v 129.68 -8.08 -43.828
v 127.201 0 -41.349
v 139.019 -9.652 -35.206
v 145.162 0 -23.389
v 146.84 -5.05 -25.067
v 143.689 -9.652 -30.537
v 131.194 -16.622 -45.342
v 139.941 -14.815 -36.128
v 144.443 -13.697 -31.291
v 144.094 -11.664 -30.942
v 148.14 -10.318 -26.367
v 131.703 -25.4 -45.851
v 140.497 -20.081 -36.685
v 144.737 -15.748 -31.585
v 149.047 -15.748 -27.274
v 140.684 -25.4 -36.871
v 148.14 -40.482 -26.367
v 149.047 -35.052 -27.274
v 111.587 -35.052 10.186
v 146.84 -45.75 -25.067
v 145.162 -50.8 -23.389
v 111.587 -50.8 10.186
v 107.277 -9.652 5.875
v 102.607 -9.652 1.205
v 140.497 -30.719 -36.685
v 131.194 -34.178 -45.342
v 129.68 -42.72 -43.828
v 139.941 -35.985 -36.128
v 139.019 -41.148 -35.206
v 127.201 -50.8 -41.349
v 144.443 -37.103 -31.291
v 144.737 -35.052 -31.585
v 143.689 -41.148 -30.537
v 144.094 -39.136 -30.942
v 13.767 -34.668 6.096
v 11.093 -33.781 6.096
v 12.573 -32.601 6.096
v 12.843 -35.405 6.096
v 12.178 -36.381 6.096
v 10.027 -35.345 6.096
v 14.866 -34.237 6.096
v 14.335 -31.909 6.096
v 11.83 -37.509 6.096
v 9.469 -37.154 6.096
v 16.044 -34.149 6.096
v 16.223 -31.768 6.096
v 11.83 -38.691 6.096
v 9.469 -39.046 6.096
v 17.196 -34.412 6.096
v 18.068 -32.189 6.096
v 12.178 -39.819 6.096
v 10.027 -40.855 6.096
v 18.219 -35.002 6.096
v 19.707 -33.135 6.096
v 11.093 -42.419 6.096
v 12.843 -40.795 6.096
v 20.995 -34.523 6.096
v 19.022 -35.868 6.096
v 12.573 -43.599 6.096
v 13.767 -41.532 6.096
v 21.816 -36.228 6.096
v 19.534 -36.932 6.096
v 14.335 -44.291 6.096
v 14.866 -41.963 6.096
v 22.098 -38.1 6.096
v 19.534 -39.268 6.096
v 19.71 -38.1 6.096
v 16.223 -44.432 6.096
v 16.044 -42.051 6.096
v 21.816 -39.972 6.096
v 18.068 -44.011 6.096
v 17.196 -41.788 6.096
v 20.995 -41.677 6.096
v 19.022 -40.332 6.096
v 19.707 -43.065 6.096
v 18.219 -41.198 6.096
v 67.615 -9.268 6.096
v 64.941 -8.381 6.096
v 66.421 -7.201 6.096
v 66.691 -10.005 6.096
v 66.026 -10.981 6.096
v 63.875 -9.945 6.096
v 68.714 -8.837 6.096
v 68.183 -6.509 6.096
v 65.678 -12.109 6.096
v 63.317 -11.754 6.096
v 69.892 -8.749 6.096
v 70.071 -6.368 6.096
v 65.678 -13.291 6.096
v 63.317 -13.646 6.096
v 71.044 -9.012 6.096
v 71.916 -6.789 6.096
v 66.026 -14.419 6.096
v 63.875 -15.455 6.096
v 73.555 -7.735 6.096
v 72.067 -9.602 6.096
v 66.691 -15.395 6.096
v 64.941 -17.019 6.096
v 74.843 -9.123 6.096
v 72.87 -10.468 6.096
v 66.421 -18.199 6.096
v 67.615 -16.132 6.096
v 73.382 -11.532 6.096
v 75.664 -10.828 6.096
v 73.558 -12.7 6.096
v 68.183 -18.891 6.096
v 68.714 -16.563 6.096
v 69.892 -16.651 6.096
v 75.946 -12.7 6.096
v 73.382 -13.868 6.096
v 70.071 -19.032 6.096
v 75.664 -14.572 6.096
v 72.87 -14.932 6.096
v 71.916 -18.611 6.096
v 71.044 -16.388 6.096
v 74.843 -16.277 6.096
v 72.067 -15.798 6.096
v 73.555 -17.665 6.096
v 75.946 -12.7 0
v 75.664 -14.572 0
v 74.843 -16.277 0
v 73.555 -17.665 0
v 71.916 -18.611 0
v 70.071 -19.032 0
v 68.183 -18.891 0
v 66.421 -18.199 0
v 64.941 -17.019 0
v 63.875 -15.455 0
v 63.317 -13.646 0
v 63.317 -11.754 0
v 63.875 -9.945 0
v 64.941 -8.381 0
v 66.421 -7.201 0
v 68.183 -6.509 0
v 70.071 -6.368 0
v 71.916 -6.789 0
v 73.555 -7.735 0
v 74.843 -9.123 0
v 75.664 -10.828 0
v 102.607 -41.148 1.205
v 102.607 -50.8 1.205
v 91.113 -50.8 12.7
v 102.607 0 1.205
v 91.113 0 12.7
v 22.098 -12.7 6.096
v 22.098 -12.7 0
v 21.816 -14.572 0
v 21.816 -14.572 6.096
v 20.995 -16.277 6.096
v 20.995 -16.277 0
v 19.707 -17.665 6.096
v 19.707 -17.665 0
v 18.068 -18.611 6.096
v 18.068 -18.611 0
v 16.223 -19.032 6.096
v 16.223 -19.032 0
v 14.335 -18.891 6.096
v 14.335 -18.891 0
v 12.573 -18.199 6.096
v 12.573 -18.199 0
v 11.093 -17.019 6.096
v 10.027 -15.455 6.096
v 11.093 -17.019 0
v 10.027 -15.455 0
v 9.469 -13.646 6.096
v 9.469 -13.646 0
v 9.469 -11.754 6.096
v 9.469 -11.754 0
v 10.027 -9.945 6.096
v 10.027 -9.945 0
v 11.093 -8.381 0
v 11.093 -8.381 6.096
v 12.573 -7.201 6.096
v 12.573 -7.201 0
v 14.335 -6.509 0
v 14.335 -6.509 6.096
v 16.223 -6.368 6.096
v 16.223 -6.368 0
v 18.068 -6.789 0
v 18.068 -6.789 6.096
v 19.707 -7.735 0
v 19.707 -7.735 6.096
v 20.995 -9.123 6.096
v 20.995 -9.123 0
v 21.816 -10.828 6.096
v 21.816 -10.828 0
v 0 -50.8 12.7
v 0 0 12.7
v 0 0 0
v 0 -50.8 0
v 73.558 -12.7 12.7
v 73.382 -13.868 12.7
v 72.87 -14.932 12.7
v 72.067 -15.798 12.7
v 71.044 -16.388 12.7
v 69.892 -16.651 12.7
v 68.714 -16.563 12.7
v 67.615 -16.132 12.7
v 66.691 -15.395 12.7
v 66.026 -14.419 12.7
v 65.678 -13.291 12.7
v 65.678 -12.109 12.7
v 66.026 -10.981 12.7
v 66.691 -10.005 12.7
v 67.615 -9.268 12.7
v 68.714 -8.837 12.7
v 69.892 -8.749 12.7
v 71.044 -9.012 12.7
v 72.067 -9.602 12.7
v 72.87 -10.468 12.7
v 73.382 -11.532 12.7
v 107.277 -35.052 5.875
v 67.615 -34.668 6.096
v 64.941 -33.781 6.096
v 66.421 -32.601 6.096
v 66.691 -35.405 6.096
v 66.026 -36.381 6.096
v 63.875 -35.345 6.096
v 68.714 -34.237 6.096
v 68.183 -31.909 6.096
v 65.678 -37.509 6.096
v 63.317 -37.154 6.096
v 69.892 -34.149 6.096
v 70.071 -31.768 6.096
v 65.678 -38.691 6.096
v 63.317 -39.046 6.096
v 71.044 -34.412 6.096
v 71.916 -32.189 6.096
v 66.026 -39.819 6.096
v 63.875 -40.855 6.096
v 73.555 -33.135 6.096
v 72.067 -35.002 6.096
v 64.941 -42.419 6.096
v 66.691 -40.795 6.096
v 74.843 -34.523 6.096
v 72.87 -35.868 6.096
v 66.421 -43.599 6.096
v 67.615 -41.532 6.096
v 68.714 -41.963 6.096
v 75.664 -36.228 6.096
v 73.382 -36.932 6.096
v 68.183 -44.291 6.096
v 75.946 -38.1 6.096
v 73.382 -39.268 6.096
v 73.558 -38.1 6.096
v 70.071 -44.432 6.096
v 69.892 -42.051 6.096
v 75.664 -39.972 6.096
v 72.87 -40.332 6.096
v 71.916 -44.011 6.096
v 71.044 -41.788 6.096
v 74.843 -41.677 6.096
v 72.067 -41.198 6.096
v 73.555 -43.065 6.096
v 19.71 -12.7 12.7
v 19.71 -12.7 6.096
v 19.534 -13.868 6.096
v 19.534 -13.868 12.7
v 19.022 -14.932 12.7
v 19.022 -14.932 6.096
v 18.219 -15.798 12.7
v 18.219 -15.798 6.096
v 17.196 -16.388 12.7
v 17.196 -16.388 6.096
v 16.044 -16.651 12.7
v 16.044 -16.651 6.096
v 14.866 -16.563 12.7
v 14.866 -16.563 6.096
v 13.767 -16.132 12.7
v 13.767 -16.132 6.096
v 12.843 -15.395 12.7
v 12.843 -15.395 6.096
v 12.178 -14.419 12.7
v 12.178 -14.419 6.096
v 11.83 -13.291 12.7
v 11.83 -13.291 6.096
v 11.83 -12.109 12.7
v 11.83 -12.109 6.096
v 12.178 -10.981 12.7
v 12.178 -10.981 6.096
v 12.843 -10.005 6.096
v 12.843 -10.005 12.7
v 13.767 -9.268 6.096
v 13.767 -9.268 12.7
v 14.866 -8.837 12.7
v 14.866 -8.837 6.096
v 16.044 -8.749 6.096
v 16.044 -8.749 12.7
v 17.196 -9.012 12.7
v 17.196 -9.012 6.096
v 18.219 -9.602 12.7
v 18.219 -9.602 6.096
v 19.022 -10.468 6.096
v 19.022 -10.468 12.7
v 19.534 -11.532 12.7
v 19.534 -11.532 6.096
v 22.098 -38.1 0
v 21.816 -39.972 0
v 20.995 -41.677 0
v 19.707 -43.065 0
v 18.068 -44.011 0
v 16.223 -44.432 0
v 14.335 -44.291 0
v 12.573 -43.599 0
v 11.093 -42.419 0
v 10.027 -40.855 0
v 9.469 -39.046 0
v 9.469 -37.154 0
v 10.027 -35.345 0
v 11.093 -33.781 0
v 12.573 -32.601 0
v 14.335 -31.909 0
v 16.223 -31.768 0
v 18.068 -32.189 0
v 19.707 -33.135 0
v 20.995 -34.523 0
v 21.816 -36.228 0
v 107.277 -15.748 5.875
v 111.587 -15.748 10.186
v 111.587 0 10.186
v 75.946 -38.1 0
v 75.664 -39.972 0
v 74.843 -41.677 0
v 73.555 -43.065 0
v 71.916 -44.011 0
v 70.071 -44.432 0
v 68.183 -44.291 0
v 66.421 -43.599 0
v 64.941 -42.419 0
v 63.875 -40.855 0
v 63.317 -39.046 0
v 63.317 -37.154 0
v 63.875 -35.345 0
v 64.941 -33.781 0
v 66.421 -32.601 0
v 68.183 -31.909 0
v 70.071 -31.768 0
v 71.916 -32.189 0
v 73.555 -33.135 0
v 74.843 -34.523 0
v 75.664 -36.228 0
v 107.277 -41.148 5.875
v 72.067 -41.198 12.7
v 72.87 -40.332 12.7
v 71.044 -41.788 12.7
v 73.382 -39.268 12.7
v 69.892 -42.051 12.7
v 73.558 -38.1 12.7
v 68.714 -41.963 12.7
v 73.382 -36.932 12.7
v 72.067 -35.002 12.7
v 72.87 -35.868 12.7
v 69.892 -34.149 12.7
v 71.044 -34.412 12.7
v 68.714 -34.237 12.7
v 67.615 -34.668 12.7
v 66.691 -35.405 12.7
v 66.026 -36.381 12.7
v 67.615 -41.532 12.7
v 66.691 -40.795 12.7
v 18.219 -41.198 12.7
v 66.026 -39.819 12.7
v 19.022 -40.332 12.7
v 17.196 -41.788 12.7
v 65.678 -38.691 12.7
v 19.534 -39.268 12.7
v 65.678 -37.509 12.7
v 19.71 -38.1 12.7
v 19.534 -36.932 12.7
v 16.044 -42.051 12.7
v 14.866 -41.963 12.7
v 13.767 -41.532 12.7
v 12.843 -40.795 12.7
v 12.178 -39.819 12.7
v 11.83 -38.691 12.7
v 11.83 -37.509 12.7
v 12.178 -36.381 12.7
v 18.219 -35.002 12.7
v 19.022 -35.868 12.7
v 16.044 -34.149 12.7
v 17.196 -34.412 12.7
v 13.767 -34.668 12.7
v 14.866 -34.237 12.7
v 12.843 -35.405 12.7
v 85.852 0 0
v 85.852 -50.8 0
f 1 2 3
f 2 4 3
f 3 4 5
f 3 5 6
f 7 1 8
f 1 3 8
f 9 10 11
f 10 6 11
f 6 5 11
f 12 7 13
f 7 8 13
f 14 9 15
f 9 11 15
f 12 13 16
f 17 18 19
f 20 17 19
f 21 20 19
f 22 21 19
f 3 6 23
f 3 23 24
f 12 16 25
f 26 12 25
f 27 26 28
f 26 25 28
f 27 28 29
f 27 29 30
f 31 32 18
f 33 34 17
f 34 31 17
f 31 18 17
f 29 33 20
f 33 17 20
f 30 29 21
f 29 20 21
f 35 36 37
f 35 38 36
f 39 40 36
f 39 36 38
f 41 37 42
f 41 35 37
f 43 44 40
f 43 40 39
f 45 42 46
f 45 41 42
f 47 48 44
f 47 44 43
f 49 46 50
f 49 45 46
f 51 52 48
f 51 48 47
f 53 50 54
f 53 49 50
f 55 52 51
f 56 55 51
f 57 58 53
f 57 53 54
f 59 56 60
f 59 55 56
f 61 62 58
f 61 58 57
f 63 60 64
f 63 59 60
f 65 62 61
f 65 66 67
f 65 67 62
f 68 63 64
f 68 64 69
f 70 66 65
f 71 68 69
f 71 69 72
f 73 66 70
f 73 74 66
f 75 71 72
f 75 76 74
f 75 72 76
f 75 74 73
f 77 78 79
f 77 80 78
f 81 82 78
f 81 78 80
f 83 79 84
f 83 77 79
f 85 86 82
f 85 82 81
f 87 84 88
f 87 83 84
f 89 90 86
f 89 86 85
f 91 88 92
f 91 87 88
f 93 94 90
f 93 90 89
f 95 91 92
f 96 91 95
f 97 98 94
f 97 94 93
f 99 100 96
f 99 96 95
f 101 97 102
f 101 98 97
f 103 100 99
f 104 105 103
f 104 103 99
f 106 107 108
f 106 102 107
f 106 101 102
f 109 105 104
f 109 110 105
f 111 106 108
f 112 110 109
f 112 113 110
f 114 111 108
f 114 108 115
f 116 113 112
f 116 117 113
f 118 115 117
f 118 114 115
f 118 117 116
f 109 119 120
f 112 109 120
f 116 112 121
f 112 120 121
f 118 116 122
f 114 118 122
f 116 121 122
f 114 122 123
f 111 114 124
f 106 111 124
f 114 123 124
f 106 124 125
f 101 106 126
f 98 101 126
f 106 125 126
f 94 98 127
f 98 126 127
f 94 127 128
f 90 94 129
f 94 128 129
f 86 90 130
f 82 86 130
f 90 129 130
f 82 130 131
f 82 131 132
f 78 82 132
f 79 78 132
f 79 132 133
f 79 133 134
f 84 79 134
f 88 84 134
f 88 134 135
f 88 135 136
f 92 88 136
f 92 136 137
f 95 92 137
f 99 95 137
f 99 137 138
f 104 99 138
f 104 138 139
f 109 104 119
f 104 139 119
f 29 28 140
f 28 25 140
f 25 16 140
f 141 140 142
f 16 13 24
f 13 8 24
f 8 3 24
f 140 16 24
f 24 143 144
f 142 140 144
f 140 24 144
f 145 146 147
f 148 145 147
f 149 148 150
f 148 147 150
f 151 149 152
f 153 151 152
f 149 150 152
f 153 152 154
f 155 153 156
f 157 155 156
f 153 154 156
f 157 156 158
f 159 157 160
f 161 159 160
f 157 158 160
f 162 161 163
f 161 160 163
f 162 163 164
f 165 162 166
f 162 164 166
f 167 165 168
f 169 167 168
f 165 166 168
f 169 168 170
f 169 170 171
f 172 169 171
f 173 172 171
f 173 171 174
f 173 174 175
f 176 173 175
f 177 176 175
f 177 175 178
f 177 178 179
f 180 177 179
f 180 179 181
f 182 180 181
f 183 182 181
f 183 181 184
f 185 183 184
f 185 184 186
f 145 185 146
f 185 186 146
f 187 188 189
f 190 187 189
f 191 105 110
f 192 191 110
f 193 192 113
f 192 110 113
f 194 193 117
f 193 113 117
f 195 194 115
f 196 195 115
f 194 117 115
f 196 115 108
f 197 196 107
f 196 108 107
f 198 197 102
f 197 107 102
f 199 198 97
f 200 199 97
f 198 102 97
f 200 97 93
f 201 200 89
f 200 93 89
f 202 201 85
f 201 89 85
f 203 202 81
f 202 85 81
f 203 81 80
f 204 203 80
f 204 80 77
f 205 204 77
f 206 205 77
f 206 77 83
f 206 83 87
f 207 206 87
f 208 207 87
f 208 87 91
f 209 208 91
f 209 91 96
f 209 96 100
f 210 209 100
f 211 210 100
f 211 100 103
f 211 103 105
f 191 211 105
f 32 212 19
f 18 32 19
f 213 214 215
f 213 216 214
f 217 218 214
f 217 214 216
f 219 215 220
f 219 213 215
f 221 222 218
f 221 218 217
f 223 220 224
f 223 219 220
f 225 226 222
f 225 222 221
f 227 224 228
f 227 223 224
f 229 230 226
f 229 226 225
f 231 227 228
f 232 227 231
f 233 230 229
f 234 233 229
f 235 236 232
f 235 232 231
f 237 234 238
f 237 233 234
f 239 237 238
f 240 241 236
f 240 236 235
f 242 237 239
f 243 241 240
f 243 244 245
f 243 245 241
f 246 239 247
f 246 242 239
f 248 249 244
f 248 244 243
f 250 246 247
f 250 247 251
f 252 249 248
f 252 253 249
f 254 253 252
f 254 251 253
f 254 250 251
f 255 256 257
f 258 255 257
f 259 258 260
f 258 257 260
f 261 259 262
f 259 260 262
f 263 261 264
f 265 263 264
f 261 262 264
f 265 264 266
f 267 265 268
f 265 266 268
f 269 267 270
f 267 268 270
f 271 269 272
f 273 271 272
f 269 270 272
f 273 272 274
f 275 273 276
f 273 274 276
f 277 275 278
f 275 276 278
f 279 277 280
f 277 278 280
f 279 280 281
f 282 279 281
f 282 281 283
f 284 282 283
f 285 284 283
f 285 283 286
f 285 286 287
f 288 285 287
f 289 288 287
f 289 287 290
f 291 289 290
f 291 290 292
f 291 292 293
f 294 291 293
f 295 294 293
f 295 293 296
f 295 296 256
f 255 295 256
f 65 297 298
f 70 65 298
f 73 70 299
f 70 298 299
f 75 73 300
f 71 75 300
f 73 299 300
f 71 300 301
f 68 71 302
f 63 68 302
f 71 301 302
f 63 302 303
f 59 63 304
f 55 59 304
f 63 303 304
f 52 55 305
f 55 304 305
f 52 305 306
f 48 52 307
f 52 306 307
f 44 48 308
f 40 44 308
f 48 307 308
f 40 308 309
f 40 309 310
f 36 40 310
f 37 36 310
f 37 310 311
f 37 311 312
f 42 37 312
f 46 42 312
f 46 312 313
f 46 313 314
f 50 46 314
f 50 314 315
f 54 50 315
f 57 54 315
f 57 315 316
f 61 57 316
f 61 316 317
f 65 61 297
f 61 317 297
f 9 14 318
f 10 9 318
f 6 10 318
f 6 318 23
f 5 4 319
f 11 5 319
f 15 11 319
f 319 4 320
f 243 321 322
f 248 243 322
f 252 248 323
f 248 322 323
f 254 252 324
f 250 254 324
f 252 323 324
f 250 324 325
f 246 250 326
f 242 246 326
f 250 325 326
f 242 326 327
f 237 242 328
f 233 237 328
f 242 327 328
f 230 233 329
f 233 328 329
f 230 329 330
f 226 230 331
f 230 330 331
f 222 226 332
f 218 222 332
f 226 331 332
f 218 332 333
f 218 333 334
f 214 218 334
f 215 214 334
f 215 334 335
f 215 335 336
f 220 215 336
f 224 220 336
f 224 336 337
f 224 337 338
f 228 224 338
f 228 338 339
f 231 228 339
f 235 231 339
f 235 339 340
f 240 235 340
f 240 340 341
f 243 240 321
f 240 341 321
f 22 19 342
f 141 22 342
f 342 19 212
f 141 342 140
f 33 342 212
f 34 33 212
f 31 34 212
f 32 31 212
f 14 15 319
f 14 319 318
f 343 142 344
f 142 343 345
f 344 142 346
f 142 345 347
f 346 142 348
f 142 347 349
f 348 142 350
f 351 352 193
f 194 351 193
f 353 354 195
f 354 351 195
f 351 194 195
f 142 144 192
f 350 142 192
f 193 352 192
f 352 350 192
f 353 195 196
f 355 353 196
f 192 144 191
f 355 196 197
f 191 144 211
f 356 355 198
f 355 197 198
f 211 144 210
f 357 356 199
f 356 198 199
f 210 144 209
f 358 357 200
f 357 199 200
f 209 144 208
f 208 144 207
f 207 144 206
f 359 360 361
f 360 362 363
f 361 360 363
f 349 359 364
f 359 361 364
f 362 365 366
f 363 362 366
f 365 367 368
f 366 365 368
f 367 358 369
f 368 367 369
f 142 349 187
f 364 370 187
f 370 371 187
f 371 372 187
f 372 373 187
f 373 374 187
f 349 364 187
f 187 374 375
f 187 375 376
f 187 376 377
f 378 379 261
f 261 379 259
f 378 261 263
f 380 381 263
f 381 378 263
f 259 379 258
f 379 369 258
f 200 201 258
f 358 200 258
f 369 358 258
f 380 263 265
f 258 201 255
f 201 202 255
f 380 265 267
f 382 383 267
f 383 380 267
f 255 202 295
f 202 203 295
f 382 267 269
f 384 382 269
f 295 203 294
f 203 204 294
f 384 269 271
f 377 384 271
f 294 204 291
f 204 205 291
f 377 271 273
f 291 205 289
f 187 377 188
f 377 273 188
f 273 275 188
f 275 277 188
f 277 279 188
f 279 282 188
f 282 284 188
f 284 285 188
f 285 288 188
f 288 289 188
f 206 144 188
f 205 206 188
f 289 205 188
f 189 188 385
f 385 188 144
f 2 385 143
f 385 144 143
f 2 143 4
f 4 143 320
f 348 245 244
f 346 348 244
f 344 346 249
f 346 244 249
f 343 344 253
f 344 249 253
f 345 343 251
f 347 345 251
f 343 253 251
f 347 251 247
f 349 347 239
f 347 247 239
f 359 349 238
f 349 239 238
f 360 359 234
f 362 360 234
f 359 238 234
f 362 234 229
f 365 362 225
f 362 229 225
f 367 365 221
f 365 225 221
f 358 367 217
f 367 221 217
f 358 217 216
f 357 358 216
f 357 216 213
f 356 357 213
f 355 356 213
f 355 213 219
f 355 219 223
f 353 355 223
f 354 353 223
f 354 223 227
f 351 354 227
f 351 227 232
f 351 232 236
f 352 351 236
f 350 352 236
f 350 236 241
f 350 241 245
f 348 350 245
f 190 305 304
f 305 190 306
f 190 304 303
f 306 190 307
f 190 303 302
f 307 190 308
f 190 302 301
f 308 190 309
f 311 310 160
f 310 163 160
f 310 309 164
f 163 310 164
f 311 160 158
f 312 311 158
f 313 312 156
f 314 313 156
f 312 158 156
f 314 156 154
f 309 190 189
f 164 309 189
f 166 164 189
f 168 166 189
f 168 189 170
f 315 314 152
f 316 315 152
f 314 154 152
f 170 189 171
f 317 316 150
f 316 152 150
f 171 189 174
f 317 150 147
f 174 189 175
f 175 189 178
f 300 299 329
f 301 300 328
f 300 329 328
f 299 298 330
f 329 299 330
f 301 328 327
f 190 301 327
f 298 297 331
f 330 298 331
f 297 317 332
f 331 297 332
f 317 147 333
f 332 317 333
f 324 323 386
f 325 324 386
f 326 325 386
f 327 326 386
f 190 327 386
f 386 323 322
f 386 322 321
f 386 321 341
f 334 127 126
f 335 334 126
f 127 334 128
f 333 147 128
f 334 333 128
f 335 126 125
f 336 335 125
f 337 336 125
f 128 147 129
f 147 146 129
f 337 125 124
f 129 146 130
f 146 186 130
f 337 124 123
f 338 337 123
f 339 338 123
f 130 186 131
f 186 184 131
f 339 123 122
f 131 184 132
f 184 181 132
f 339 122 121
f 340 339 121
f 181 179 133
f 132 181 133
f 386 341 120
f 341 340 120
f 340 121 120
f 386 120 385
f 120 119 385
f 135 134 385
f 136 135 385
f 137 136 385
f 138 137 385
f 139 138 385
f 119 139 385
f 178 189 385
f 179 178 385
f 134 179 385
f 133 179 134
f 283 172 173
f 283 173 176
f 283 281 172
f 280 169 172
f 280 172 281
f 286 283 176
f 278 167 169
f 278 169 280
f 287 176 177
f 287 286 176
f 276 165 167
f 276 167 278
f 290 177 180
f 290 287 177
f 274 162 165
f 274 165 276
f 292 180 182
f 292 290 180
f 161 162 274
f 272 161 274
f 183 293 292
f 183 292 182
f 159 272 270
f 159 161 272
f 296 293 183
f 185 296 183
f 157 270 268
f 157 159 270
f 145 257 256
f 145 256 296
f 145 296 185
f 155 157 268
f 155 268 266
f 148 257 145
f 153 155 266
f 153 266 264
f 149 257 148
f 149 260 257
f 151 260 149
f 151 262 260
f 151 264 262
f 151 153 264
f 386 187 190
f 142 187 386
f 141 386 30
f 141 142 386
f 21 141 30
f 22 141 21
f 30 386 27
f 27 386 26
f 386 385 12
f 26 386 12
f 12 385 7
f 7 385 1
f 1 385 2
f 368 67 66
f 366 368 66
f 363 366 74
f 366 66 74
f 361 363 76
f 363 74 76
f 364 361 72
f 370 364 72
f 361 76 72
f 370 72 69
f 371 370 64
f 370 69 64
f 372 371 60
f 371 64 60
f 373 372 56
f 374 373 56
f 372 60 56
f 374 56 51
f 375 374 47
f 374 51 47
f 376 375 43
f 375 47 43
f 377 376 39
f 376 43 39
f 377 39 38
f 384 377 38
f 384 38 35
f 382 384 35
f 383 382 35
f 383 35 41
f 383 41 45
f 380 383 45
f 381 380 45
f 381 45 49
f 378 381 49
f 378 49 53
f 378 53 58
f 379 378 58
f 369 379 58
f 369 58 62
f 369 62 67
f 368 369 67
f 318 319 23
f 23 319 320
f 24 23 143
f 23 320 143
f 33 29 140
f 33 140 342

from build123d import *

# Parameters (mm, degrees)
F1_DEPTH = 50.8
F3_DEPTH = 25.4
F5_DEPTH = 66.549
F6_R     = 3.9624
F7_DEPTH = 12.701
F6_R_2   = 6.35
F8_DEPTH = 6.096


with BuildPart() as f1:
    # F0 (on Front) → F1 (new body)
    with BuildSketch(Plane.XZ):
        Polygon((0, 12.7), (0, 0), (85.852, 0), (131.70327, -45.85127), (149.663782, -27.890758), (111.587496, 10.185528), (102.60724, 1.205272), (91.112512, 12.7), align=None)
    extrude(amount=F1_DEPTH)

    # F2 (on face) → F3 (cut)
    with BuildSketch(Plane(origin=(60.886512, 0, 60.886512), x_dir=(0.707107, 0, -0.707107), z_dir=(0.707107, 0, 0.707107))):
        with BuildLine():
            Line((125.550019, -50.8), (125.550019, -25.4))
            ThreePointArc((125.550019, -25.4), (123.934026, -38.492922), (119.183037, -50.8))
            Line((119.183037, -50.8), (125.550019, -50.8))
        make_face()
        with BuildLine():
            Line((125.550019, -25.4), (125.550019, 0))
            Line((125.550019, 0), (119.183037, 0))
            ThreePointArc((119.183037, 0), (123.934026, -12.307078), (125.550019, -25.4))
        make_face()
    extrude(amount=-F3_DEPTH, mode=Mode.SUBTRACT)

    # F4 (on face) → F5 (cut, through all)
    with BuildSketch(Plane(origin=(50.700984, 0, -50.700984), x_dir=(0, -1, 0), z_dir=(-0.707107, 0, 0.707107))):
        Polygon((41.148, 80.010531), (35.052, 80.010531), (35.052, 86.106531), (15.748, 86.106531), (15.748, 80.010531), (9.652, 80.010531), (9.652, 73.406531), (41.148, 73.406531), align=None)
    extrude(amount=-F5_DEPTH, mode=Mode.SUBTRACT)

    # F6 (on face) → F7 (cut, through all)
    with BuildSketch(Plane(origin=(0, 0, 0), x_dir=(1, 0, 0), z_dir=(0, 0, -1))):
        with Locations((15.748, 12.7)):
            Circle(F6_R)
        with Locations((15.748, 38.1)):
            Circle(F6_R)
        with Locations((69.596, 38.1)):
            Circle(F6_R)
        with Locations((69.596, 12.7)):
            Circle(F6_R)
    extrude(amount=-F7_DEPTH, mode=Mode.SUBTRACT)

    # F6 (on face) → F8 (cut)
    with BuildSketch(Plane(origin=(0, 0, 0), x_dir=(1, 0, 0), z_dir=(0, 0, -1))):
        with Locations((15.748, 12.7)):
            Circle(F6_R_2)
        with Locations((15.748, 12.7)):
            Circle(F6_R, mode=Mode.SUBTRACT)
        with Locations((15.748, 38.1)):
            Circle(F6_R_2)
        with Locations((15.748, 38.1)):
            Circle(F6_R, mode=Mode.SUBTRACT)
        with Locations((69.596, 12.7)):
            Circle(F6_R_2)
        with Locations((69.596, 12.7)):
            Circle(F6_R, mode=Mode.SUBTRACT)
        with Locations((69.596, 38.1)):
            Circle(F6_R_2)
        with Locations((69.596, 38.1)):
            Circle(F6_R, mode=Mode.SUBTRACT)
    extrude(amount=-F8_DEPTH, mode=Mode.SUBTRACT)


solid = f1.part
